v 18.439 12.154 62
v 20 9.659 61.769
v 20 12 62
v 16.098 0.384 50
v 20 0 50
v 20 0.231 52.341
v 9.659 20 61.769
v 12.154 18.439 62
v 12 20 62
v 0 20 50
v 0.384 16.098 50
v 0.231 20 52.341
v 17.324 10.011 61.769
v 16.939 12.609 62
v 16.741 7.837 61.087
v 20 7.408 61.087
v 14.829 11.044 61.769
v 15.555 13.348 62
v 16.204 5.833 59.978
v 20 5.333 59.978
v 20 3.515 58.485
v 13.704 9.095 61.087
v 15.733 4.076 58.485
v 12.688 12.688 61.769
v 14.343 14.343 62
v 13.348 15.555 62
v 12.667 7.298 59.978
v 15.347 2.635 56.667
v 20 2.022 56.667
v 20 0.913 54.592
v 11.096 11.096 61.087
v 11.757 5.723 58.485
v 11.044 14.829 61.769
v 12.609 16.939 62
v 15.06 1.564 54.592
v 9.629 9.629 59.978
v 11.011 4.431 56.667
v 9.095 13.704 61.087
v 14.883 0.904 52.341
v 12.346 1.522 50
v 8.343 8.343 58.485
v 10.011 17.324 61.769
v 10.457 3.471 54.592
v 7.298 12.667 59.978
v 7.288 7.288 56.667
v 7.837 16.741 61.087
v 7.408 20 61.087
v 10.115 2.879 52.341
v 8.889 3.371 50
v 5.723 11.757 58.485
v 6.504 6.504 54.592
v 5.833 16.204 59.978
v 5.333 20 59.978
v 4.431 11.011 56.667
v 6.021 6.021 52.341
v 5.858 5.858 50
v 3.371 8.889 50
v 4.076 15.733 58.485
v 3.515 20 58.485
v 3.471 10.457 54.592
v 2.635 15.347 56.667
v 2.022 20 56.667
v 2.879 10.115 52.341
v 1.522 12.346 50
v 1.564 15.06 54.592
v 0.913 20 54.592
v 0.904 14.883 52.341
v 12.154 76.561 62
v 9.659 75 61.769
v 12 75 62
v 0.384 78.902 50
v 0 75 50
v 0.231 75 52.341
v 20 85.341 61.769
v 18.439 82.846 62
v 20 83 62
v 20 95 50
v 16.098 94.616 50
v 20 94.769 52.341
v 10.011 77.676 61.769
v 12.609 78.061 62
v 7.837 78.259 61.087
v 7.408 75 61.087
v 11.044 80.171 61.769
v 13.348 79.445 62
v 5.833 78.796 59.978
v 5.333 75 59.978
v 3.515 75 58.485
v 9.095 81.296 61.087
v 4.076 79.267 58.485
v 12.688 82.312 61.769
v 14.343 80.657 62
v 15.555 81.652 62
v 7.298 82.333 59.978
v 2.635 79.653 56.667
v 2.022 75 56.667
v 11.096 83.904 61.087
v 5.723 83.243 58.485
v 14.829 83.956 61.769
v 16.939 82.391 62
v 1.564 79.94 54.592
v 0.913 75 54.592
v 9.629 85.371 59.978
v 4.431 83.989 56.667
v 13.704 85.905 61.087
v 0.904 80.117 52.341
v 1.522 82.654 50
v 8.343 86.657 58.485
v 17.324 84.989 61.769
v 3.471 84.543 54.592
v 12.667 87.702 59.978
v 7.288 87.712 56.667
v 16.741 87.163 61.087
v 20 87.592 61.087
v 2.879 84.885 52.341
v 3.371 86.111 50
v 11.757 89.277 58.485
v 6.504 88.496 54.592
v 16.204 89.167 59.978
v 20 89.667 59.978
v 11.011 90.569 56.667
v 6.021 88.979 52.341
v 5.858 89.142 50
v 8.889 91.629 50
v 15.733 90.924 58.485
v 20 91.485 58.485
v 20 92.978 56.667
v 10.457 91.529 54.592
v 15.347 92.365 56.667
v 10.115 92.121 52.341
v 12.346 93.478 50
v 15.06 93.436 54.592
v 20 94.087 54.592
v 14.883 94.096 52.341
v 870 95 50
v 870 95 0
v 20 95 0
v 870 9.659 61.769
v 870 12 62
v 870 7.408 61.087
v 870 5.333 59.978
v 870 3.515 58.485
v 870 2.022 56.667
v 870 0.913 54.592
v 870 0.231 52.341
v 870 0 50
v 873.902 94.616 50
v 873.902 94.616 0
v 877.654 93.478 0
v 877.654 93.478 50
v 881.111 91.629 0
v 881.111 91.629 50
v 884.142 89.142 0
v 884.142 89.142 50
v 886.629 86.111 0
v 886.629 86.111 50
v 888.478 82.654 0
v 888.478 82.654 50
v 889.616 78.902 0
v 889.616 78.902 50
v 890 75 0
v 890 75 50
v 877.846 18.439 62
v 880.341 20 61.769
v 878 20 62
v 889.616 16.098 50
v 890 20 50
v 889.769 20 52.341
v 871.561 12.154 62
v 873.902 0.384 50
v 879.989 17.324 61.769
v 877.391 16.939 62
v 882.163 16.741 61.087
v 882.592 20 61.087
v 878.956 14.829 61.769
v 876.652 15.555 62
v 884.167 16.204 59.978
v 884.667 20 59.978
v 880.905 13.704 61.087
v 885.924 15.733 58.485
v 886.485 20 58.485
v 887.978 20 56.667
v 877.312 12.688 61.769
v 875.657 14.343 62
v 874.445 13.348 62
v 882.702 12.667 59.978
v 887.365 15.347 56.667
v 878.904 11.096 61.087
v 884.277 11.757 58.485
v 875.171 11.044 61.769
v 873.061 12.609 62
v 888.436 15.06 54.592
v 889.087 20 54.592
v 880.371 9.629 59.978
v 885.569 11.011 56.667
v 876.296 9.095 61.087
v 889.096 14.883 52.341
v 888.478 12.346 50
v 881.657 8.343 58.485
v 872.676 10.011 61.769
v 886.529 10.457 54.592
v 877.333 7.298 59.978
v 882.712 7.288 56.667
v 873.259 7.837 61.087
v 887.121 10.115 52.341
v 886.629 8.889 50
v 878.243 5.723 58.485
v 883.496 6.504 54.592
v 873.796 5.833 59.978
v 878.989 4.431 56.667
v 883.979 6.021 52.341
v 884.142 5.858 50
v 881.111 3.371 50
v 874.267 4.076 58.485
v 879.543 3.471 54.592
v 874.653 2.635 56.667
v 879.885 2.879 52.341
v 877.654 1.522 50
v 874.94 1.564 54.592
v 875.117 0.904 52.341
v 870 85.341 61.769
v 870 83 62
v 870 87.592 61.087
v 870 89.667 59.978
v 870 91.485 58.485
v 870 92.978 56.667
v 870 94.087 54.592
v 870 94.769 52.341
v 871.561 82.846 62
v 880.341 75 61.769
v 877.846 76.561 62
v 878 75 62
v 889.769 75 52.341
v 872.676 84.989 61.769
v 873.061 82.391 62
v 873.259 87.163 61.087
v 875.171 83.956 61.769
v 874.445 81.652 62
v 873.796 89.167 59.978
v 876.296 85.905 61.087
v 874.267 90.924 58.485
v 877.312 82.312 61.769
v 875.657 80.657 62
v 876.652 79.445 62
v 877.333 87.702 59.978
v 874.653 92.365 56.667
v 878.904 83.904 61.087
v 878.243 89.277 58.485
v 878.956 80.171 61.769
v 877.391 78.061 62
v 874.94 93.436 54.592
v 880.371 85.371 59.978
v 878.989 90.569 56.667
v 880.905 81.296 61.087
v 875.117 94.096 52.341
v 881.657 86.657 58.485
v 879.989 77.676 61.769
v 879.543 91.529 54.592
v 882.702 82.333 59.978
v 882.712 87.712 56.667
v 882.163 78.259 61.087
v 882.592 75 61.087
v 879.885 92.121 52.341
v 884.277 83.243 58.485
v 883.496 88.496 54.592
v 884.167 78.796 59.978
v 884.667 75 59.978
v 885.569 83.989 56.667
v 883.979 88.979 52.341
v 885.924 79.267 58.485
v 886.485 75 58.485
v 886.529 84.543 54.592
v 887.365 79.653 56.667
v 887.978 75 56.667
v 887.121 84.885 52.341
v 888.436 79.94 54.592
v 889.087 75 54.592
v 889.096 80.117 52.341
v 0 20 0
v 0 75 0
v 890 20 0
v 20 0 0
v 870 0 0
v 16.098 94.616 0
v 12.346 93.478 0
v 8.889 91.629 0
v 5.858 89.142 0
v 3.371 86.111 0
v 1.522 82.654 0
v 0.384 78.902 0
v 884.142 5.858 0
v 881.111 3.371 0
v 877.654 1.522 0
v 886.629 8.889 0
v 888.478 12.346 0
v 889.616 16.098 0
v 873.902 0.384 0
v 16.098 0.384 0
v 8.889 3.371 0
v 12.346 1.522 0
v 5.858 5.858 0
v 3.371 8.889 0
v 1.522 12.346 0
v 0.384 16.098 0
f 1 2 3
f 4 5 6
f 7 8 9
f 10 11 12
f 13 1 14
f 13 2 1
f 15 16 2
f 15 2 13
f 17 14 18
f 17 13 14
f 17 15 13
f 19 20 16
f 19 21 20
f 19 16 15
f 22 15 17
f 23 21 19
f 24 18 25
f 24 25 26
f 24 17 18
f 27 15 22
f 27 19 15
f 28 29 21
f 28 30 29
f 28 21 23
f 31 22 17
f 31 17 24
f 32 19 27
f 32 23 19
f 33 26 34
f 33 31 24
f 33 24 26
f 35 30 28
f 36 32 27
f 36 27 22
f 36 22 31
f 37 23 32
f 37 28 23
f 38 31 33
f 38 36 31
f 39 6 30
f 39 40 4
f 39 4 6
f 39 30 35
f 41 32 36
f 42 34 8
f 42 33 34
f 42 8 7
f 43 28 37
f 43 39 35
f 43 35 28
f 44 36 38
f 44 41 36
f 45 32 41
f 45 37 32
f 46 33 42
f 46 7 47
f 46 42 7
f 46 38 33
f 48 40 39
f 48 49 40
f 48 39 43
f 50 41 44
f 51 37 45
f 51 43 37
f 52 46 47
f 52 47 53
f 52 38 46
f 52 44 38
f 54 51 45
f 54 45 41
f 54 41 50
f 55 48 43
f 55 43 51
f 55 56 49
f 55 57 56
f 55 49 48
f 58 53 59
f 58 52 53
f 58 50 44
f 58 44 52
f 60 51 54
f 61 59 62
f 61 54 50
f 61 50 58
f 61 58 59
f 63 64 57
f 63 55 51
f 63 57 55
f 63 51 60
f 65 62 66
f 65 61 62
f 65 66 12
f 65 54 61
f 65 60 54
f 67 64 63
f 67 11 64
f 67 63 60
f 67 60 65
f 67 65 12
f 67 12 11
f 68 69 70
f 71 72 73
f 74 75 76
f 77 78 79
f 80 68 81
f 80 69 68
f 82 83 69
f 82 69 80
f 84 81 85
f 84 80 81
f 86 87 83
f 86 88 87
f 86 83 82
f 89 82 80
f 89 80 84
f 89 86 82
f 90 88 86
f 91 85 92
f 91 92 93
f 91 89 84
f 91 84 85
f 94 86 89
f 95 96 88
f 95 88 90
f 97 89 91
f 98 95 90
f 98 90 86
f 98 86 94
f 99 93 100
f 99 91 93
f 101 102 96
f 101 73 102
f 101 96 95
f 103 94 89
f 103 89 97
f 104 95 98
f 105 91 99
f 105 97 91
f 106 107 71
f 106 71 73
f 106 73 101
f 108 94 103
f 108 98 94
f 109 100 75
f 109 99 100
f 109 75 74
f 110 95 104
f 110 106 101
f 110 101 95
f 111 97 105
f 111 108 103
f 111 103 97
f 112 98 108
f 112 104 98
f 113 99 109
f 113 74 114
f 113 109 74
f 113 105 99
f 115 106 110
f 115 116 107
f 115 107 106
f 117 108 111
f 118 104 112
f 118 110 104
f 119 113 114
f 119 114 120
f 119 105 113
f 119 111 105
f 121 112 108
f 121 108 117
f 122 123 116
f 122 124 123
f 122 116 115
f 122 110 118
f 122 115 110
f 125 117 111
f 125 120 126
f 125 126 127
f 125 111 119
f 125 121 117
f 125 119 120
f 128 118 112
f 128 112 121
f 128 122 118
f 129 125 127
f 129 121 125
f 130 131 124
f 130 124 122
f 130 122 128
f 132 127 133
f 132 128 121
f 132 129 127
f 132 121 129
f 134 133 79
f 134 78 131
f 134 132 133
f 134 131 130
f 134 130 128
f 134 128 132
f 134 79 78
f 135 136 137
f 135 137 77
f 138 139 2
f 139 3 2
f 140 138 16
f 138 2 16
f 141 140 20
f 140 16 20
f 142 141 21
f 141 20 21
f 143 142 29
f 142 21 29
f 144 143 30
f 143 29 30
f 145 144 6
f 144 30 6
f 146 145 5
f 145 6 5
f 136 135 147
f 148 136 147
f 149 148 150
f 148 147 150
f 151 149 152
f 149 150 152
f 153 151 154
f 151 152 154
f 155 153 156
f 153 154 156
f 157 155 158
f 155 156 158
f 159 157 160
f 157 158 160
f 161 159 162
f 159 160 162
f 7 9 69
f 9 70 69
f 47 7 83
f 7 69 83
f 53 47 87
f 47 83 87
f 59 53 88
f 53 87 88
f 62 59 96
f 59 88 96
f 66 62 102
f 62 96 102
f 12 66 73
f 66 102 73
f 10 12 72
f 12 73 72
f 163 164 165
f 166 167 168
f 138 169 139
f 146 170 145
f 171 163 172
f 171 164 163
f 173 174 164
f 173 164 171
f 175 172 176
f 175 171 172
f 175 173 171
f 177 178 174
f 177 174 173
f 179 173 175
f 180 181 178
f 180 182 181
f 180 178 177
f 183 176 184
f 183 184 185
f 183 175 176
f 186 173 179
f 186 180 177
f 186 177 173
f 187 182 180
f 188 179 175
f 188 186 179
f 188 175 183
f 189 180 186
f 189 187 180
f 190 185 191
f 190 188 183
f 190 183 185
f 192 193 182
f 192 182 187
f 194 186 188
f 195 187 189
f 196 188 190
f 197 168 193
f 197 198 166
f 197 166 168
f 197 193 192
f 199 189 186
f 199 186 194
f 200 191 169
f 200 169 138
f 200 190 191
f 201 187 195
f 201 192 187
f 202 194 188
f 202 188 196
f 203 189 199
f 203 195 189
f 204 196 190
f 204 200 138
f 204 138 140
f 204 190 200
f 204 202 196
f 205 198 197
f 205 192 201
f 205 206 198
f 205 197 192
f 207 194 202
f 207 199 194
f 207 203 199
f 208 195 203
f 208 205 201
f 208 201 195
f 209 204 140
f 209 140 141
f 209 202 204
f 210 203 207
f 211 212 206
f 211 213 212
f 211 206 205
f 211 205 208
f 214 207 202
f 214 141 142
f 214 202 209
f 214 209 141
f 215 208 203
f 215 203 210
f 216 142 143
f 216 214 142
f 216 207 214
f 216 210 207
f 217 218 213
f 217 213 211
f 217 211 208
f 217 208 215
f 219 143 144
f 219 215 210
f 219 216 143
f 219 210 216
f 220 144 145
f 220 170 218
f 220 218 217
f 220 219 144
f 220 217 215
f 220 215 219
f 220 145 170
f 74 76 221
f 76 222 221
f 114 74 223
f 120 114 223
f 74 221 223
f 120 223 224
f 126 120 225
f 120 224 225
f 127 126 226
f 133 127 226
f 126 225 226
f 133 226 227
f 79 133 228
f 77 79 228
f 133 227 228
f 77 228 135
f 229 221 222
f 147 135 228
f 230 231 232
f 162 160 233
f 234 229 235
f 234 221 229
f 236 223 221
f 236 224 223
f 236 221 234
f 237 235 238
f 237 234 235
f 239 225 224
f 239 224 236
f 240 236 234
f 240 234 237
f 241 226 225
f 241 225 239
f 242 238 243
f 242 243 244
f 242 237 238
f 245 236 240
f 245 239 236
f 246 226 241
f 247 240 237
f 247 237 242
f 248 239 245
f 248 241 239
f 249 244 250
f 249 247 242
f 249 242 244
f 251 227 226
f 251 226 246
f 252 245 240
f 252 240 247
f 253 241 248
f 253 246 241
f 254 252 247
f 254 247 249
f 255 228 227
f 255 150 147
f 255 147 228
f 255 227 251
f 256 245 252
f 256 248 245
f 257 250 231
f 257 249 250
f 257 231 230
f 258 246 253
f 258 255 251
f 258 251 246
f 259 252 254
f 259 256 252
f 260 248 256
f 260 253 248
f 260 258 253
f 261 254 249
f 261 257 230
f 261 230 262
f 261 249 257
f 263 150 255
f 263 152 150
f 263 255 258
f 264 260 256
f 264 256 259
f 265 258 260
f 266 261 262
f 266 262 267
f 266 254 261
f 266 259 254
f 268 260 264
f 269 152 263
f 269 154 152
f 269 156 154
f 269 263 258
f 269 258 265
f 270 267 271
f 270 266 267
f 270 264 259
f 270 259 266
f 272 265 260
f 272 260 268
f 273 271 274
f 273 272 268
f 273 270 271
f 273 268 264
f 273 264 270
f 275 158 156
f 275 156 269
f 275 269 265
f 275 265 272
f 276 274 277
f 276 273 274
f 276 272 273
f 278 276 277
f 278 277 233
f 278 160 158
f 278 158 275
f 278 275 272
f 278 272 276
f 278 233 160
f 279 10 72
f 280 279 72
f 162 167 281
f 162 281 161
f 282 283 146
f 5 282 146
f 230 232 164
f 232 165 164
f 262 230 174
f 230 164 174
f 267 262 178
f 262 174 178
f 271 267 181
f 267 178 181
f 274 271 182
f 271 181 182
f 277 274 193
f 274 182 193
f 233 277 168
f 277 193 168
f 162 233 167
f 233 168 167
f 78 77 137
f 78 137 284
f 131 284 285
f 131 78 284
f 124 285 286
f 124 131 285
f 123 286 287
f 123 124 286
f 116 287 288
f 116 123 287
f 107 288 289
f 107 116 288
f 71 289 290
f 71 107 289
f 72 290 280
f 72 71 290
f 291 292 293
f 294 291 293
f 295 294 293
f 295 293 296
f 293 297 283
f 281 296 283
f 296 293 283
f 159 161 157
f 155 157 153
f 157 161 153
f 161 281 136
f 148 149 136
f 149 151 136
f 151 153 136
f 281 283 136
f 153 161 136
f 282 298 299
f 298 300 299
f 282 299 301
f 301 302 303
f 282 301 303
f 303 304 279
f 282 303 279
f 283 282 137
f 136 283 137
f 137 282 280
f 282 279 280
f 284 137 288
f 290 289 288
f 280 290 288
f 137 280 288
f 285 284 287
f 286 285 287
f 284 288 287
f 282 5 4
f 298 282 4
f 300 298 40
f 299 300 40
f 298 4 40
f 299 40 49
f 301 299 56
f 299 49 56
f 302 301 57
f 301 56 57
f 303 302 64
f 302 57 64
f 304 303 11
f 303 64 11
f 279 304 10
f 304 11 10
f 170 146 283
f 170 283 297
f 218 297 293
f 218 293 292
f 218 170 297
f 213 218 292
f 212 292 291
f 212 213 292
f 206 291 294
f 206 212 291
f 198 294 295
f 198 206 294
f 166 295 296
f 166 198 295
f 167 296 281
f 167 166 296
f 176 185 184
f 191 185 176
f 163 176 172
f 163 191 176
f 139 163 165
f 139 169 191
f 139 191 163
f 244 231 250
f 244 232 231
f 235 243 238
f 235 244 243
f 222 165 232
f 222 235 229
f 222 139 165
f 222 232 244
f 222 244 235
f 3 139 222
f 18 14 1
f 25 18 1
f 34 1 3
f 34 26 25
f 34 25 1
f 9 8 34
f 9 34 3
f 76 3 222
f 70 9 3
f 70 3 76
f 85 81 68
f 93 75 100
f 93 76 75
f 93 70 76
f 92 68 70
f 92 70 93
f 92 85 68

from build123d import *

# Parameters (mm, degrees)
SKETCH_W    = 95
SKETCH_H    = 62
PAD_DEPTH   = 890
FILLET_R    = 20
FILLET001_R = 12


with BuildPart() as part:
    # Sketch → Pad (new body)
    with BuildSketch(Plane.YZ):
        with Locations((47.5, 31)):
            Rectangle(SKETCH_W, SKETCH_H)
    extrude(amount=PAD_DEPTH)

    # Fillet
    fillet_edges = [part.edges().sort_by_distance(p)[0] for p in [
        (0, 0, 31),
        (890, 0, 31),
        (890, 95, 31),
        (0, 95, 31),
    ]]
    fillet(fillet_edges, radius=FILLET_R)

    # Fillet001
    fillet001_edges = [part.edges().sort_by_distance(p)[0] for p in [
        (445, 95, 62),
        (5.857864, 89.142136, 62),
        (884.142136, 89.142136, 62),
        (0, 47.5, 62),
        (890, 47.5, 62),
        (5.857864, 5.857864, 62),
        (884.142136, 5.857864, 62),
        (445, 0, 62),
    ]]
    fillet(fillet001_edges, radius=FILLET001_R)


solid = part.part
